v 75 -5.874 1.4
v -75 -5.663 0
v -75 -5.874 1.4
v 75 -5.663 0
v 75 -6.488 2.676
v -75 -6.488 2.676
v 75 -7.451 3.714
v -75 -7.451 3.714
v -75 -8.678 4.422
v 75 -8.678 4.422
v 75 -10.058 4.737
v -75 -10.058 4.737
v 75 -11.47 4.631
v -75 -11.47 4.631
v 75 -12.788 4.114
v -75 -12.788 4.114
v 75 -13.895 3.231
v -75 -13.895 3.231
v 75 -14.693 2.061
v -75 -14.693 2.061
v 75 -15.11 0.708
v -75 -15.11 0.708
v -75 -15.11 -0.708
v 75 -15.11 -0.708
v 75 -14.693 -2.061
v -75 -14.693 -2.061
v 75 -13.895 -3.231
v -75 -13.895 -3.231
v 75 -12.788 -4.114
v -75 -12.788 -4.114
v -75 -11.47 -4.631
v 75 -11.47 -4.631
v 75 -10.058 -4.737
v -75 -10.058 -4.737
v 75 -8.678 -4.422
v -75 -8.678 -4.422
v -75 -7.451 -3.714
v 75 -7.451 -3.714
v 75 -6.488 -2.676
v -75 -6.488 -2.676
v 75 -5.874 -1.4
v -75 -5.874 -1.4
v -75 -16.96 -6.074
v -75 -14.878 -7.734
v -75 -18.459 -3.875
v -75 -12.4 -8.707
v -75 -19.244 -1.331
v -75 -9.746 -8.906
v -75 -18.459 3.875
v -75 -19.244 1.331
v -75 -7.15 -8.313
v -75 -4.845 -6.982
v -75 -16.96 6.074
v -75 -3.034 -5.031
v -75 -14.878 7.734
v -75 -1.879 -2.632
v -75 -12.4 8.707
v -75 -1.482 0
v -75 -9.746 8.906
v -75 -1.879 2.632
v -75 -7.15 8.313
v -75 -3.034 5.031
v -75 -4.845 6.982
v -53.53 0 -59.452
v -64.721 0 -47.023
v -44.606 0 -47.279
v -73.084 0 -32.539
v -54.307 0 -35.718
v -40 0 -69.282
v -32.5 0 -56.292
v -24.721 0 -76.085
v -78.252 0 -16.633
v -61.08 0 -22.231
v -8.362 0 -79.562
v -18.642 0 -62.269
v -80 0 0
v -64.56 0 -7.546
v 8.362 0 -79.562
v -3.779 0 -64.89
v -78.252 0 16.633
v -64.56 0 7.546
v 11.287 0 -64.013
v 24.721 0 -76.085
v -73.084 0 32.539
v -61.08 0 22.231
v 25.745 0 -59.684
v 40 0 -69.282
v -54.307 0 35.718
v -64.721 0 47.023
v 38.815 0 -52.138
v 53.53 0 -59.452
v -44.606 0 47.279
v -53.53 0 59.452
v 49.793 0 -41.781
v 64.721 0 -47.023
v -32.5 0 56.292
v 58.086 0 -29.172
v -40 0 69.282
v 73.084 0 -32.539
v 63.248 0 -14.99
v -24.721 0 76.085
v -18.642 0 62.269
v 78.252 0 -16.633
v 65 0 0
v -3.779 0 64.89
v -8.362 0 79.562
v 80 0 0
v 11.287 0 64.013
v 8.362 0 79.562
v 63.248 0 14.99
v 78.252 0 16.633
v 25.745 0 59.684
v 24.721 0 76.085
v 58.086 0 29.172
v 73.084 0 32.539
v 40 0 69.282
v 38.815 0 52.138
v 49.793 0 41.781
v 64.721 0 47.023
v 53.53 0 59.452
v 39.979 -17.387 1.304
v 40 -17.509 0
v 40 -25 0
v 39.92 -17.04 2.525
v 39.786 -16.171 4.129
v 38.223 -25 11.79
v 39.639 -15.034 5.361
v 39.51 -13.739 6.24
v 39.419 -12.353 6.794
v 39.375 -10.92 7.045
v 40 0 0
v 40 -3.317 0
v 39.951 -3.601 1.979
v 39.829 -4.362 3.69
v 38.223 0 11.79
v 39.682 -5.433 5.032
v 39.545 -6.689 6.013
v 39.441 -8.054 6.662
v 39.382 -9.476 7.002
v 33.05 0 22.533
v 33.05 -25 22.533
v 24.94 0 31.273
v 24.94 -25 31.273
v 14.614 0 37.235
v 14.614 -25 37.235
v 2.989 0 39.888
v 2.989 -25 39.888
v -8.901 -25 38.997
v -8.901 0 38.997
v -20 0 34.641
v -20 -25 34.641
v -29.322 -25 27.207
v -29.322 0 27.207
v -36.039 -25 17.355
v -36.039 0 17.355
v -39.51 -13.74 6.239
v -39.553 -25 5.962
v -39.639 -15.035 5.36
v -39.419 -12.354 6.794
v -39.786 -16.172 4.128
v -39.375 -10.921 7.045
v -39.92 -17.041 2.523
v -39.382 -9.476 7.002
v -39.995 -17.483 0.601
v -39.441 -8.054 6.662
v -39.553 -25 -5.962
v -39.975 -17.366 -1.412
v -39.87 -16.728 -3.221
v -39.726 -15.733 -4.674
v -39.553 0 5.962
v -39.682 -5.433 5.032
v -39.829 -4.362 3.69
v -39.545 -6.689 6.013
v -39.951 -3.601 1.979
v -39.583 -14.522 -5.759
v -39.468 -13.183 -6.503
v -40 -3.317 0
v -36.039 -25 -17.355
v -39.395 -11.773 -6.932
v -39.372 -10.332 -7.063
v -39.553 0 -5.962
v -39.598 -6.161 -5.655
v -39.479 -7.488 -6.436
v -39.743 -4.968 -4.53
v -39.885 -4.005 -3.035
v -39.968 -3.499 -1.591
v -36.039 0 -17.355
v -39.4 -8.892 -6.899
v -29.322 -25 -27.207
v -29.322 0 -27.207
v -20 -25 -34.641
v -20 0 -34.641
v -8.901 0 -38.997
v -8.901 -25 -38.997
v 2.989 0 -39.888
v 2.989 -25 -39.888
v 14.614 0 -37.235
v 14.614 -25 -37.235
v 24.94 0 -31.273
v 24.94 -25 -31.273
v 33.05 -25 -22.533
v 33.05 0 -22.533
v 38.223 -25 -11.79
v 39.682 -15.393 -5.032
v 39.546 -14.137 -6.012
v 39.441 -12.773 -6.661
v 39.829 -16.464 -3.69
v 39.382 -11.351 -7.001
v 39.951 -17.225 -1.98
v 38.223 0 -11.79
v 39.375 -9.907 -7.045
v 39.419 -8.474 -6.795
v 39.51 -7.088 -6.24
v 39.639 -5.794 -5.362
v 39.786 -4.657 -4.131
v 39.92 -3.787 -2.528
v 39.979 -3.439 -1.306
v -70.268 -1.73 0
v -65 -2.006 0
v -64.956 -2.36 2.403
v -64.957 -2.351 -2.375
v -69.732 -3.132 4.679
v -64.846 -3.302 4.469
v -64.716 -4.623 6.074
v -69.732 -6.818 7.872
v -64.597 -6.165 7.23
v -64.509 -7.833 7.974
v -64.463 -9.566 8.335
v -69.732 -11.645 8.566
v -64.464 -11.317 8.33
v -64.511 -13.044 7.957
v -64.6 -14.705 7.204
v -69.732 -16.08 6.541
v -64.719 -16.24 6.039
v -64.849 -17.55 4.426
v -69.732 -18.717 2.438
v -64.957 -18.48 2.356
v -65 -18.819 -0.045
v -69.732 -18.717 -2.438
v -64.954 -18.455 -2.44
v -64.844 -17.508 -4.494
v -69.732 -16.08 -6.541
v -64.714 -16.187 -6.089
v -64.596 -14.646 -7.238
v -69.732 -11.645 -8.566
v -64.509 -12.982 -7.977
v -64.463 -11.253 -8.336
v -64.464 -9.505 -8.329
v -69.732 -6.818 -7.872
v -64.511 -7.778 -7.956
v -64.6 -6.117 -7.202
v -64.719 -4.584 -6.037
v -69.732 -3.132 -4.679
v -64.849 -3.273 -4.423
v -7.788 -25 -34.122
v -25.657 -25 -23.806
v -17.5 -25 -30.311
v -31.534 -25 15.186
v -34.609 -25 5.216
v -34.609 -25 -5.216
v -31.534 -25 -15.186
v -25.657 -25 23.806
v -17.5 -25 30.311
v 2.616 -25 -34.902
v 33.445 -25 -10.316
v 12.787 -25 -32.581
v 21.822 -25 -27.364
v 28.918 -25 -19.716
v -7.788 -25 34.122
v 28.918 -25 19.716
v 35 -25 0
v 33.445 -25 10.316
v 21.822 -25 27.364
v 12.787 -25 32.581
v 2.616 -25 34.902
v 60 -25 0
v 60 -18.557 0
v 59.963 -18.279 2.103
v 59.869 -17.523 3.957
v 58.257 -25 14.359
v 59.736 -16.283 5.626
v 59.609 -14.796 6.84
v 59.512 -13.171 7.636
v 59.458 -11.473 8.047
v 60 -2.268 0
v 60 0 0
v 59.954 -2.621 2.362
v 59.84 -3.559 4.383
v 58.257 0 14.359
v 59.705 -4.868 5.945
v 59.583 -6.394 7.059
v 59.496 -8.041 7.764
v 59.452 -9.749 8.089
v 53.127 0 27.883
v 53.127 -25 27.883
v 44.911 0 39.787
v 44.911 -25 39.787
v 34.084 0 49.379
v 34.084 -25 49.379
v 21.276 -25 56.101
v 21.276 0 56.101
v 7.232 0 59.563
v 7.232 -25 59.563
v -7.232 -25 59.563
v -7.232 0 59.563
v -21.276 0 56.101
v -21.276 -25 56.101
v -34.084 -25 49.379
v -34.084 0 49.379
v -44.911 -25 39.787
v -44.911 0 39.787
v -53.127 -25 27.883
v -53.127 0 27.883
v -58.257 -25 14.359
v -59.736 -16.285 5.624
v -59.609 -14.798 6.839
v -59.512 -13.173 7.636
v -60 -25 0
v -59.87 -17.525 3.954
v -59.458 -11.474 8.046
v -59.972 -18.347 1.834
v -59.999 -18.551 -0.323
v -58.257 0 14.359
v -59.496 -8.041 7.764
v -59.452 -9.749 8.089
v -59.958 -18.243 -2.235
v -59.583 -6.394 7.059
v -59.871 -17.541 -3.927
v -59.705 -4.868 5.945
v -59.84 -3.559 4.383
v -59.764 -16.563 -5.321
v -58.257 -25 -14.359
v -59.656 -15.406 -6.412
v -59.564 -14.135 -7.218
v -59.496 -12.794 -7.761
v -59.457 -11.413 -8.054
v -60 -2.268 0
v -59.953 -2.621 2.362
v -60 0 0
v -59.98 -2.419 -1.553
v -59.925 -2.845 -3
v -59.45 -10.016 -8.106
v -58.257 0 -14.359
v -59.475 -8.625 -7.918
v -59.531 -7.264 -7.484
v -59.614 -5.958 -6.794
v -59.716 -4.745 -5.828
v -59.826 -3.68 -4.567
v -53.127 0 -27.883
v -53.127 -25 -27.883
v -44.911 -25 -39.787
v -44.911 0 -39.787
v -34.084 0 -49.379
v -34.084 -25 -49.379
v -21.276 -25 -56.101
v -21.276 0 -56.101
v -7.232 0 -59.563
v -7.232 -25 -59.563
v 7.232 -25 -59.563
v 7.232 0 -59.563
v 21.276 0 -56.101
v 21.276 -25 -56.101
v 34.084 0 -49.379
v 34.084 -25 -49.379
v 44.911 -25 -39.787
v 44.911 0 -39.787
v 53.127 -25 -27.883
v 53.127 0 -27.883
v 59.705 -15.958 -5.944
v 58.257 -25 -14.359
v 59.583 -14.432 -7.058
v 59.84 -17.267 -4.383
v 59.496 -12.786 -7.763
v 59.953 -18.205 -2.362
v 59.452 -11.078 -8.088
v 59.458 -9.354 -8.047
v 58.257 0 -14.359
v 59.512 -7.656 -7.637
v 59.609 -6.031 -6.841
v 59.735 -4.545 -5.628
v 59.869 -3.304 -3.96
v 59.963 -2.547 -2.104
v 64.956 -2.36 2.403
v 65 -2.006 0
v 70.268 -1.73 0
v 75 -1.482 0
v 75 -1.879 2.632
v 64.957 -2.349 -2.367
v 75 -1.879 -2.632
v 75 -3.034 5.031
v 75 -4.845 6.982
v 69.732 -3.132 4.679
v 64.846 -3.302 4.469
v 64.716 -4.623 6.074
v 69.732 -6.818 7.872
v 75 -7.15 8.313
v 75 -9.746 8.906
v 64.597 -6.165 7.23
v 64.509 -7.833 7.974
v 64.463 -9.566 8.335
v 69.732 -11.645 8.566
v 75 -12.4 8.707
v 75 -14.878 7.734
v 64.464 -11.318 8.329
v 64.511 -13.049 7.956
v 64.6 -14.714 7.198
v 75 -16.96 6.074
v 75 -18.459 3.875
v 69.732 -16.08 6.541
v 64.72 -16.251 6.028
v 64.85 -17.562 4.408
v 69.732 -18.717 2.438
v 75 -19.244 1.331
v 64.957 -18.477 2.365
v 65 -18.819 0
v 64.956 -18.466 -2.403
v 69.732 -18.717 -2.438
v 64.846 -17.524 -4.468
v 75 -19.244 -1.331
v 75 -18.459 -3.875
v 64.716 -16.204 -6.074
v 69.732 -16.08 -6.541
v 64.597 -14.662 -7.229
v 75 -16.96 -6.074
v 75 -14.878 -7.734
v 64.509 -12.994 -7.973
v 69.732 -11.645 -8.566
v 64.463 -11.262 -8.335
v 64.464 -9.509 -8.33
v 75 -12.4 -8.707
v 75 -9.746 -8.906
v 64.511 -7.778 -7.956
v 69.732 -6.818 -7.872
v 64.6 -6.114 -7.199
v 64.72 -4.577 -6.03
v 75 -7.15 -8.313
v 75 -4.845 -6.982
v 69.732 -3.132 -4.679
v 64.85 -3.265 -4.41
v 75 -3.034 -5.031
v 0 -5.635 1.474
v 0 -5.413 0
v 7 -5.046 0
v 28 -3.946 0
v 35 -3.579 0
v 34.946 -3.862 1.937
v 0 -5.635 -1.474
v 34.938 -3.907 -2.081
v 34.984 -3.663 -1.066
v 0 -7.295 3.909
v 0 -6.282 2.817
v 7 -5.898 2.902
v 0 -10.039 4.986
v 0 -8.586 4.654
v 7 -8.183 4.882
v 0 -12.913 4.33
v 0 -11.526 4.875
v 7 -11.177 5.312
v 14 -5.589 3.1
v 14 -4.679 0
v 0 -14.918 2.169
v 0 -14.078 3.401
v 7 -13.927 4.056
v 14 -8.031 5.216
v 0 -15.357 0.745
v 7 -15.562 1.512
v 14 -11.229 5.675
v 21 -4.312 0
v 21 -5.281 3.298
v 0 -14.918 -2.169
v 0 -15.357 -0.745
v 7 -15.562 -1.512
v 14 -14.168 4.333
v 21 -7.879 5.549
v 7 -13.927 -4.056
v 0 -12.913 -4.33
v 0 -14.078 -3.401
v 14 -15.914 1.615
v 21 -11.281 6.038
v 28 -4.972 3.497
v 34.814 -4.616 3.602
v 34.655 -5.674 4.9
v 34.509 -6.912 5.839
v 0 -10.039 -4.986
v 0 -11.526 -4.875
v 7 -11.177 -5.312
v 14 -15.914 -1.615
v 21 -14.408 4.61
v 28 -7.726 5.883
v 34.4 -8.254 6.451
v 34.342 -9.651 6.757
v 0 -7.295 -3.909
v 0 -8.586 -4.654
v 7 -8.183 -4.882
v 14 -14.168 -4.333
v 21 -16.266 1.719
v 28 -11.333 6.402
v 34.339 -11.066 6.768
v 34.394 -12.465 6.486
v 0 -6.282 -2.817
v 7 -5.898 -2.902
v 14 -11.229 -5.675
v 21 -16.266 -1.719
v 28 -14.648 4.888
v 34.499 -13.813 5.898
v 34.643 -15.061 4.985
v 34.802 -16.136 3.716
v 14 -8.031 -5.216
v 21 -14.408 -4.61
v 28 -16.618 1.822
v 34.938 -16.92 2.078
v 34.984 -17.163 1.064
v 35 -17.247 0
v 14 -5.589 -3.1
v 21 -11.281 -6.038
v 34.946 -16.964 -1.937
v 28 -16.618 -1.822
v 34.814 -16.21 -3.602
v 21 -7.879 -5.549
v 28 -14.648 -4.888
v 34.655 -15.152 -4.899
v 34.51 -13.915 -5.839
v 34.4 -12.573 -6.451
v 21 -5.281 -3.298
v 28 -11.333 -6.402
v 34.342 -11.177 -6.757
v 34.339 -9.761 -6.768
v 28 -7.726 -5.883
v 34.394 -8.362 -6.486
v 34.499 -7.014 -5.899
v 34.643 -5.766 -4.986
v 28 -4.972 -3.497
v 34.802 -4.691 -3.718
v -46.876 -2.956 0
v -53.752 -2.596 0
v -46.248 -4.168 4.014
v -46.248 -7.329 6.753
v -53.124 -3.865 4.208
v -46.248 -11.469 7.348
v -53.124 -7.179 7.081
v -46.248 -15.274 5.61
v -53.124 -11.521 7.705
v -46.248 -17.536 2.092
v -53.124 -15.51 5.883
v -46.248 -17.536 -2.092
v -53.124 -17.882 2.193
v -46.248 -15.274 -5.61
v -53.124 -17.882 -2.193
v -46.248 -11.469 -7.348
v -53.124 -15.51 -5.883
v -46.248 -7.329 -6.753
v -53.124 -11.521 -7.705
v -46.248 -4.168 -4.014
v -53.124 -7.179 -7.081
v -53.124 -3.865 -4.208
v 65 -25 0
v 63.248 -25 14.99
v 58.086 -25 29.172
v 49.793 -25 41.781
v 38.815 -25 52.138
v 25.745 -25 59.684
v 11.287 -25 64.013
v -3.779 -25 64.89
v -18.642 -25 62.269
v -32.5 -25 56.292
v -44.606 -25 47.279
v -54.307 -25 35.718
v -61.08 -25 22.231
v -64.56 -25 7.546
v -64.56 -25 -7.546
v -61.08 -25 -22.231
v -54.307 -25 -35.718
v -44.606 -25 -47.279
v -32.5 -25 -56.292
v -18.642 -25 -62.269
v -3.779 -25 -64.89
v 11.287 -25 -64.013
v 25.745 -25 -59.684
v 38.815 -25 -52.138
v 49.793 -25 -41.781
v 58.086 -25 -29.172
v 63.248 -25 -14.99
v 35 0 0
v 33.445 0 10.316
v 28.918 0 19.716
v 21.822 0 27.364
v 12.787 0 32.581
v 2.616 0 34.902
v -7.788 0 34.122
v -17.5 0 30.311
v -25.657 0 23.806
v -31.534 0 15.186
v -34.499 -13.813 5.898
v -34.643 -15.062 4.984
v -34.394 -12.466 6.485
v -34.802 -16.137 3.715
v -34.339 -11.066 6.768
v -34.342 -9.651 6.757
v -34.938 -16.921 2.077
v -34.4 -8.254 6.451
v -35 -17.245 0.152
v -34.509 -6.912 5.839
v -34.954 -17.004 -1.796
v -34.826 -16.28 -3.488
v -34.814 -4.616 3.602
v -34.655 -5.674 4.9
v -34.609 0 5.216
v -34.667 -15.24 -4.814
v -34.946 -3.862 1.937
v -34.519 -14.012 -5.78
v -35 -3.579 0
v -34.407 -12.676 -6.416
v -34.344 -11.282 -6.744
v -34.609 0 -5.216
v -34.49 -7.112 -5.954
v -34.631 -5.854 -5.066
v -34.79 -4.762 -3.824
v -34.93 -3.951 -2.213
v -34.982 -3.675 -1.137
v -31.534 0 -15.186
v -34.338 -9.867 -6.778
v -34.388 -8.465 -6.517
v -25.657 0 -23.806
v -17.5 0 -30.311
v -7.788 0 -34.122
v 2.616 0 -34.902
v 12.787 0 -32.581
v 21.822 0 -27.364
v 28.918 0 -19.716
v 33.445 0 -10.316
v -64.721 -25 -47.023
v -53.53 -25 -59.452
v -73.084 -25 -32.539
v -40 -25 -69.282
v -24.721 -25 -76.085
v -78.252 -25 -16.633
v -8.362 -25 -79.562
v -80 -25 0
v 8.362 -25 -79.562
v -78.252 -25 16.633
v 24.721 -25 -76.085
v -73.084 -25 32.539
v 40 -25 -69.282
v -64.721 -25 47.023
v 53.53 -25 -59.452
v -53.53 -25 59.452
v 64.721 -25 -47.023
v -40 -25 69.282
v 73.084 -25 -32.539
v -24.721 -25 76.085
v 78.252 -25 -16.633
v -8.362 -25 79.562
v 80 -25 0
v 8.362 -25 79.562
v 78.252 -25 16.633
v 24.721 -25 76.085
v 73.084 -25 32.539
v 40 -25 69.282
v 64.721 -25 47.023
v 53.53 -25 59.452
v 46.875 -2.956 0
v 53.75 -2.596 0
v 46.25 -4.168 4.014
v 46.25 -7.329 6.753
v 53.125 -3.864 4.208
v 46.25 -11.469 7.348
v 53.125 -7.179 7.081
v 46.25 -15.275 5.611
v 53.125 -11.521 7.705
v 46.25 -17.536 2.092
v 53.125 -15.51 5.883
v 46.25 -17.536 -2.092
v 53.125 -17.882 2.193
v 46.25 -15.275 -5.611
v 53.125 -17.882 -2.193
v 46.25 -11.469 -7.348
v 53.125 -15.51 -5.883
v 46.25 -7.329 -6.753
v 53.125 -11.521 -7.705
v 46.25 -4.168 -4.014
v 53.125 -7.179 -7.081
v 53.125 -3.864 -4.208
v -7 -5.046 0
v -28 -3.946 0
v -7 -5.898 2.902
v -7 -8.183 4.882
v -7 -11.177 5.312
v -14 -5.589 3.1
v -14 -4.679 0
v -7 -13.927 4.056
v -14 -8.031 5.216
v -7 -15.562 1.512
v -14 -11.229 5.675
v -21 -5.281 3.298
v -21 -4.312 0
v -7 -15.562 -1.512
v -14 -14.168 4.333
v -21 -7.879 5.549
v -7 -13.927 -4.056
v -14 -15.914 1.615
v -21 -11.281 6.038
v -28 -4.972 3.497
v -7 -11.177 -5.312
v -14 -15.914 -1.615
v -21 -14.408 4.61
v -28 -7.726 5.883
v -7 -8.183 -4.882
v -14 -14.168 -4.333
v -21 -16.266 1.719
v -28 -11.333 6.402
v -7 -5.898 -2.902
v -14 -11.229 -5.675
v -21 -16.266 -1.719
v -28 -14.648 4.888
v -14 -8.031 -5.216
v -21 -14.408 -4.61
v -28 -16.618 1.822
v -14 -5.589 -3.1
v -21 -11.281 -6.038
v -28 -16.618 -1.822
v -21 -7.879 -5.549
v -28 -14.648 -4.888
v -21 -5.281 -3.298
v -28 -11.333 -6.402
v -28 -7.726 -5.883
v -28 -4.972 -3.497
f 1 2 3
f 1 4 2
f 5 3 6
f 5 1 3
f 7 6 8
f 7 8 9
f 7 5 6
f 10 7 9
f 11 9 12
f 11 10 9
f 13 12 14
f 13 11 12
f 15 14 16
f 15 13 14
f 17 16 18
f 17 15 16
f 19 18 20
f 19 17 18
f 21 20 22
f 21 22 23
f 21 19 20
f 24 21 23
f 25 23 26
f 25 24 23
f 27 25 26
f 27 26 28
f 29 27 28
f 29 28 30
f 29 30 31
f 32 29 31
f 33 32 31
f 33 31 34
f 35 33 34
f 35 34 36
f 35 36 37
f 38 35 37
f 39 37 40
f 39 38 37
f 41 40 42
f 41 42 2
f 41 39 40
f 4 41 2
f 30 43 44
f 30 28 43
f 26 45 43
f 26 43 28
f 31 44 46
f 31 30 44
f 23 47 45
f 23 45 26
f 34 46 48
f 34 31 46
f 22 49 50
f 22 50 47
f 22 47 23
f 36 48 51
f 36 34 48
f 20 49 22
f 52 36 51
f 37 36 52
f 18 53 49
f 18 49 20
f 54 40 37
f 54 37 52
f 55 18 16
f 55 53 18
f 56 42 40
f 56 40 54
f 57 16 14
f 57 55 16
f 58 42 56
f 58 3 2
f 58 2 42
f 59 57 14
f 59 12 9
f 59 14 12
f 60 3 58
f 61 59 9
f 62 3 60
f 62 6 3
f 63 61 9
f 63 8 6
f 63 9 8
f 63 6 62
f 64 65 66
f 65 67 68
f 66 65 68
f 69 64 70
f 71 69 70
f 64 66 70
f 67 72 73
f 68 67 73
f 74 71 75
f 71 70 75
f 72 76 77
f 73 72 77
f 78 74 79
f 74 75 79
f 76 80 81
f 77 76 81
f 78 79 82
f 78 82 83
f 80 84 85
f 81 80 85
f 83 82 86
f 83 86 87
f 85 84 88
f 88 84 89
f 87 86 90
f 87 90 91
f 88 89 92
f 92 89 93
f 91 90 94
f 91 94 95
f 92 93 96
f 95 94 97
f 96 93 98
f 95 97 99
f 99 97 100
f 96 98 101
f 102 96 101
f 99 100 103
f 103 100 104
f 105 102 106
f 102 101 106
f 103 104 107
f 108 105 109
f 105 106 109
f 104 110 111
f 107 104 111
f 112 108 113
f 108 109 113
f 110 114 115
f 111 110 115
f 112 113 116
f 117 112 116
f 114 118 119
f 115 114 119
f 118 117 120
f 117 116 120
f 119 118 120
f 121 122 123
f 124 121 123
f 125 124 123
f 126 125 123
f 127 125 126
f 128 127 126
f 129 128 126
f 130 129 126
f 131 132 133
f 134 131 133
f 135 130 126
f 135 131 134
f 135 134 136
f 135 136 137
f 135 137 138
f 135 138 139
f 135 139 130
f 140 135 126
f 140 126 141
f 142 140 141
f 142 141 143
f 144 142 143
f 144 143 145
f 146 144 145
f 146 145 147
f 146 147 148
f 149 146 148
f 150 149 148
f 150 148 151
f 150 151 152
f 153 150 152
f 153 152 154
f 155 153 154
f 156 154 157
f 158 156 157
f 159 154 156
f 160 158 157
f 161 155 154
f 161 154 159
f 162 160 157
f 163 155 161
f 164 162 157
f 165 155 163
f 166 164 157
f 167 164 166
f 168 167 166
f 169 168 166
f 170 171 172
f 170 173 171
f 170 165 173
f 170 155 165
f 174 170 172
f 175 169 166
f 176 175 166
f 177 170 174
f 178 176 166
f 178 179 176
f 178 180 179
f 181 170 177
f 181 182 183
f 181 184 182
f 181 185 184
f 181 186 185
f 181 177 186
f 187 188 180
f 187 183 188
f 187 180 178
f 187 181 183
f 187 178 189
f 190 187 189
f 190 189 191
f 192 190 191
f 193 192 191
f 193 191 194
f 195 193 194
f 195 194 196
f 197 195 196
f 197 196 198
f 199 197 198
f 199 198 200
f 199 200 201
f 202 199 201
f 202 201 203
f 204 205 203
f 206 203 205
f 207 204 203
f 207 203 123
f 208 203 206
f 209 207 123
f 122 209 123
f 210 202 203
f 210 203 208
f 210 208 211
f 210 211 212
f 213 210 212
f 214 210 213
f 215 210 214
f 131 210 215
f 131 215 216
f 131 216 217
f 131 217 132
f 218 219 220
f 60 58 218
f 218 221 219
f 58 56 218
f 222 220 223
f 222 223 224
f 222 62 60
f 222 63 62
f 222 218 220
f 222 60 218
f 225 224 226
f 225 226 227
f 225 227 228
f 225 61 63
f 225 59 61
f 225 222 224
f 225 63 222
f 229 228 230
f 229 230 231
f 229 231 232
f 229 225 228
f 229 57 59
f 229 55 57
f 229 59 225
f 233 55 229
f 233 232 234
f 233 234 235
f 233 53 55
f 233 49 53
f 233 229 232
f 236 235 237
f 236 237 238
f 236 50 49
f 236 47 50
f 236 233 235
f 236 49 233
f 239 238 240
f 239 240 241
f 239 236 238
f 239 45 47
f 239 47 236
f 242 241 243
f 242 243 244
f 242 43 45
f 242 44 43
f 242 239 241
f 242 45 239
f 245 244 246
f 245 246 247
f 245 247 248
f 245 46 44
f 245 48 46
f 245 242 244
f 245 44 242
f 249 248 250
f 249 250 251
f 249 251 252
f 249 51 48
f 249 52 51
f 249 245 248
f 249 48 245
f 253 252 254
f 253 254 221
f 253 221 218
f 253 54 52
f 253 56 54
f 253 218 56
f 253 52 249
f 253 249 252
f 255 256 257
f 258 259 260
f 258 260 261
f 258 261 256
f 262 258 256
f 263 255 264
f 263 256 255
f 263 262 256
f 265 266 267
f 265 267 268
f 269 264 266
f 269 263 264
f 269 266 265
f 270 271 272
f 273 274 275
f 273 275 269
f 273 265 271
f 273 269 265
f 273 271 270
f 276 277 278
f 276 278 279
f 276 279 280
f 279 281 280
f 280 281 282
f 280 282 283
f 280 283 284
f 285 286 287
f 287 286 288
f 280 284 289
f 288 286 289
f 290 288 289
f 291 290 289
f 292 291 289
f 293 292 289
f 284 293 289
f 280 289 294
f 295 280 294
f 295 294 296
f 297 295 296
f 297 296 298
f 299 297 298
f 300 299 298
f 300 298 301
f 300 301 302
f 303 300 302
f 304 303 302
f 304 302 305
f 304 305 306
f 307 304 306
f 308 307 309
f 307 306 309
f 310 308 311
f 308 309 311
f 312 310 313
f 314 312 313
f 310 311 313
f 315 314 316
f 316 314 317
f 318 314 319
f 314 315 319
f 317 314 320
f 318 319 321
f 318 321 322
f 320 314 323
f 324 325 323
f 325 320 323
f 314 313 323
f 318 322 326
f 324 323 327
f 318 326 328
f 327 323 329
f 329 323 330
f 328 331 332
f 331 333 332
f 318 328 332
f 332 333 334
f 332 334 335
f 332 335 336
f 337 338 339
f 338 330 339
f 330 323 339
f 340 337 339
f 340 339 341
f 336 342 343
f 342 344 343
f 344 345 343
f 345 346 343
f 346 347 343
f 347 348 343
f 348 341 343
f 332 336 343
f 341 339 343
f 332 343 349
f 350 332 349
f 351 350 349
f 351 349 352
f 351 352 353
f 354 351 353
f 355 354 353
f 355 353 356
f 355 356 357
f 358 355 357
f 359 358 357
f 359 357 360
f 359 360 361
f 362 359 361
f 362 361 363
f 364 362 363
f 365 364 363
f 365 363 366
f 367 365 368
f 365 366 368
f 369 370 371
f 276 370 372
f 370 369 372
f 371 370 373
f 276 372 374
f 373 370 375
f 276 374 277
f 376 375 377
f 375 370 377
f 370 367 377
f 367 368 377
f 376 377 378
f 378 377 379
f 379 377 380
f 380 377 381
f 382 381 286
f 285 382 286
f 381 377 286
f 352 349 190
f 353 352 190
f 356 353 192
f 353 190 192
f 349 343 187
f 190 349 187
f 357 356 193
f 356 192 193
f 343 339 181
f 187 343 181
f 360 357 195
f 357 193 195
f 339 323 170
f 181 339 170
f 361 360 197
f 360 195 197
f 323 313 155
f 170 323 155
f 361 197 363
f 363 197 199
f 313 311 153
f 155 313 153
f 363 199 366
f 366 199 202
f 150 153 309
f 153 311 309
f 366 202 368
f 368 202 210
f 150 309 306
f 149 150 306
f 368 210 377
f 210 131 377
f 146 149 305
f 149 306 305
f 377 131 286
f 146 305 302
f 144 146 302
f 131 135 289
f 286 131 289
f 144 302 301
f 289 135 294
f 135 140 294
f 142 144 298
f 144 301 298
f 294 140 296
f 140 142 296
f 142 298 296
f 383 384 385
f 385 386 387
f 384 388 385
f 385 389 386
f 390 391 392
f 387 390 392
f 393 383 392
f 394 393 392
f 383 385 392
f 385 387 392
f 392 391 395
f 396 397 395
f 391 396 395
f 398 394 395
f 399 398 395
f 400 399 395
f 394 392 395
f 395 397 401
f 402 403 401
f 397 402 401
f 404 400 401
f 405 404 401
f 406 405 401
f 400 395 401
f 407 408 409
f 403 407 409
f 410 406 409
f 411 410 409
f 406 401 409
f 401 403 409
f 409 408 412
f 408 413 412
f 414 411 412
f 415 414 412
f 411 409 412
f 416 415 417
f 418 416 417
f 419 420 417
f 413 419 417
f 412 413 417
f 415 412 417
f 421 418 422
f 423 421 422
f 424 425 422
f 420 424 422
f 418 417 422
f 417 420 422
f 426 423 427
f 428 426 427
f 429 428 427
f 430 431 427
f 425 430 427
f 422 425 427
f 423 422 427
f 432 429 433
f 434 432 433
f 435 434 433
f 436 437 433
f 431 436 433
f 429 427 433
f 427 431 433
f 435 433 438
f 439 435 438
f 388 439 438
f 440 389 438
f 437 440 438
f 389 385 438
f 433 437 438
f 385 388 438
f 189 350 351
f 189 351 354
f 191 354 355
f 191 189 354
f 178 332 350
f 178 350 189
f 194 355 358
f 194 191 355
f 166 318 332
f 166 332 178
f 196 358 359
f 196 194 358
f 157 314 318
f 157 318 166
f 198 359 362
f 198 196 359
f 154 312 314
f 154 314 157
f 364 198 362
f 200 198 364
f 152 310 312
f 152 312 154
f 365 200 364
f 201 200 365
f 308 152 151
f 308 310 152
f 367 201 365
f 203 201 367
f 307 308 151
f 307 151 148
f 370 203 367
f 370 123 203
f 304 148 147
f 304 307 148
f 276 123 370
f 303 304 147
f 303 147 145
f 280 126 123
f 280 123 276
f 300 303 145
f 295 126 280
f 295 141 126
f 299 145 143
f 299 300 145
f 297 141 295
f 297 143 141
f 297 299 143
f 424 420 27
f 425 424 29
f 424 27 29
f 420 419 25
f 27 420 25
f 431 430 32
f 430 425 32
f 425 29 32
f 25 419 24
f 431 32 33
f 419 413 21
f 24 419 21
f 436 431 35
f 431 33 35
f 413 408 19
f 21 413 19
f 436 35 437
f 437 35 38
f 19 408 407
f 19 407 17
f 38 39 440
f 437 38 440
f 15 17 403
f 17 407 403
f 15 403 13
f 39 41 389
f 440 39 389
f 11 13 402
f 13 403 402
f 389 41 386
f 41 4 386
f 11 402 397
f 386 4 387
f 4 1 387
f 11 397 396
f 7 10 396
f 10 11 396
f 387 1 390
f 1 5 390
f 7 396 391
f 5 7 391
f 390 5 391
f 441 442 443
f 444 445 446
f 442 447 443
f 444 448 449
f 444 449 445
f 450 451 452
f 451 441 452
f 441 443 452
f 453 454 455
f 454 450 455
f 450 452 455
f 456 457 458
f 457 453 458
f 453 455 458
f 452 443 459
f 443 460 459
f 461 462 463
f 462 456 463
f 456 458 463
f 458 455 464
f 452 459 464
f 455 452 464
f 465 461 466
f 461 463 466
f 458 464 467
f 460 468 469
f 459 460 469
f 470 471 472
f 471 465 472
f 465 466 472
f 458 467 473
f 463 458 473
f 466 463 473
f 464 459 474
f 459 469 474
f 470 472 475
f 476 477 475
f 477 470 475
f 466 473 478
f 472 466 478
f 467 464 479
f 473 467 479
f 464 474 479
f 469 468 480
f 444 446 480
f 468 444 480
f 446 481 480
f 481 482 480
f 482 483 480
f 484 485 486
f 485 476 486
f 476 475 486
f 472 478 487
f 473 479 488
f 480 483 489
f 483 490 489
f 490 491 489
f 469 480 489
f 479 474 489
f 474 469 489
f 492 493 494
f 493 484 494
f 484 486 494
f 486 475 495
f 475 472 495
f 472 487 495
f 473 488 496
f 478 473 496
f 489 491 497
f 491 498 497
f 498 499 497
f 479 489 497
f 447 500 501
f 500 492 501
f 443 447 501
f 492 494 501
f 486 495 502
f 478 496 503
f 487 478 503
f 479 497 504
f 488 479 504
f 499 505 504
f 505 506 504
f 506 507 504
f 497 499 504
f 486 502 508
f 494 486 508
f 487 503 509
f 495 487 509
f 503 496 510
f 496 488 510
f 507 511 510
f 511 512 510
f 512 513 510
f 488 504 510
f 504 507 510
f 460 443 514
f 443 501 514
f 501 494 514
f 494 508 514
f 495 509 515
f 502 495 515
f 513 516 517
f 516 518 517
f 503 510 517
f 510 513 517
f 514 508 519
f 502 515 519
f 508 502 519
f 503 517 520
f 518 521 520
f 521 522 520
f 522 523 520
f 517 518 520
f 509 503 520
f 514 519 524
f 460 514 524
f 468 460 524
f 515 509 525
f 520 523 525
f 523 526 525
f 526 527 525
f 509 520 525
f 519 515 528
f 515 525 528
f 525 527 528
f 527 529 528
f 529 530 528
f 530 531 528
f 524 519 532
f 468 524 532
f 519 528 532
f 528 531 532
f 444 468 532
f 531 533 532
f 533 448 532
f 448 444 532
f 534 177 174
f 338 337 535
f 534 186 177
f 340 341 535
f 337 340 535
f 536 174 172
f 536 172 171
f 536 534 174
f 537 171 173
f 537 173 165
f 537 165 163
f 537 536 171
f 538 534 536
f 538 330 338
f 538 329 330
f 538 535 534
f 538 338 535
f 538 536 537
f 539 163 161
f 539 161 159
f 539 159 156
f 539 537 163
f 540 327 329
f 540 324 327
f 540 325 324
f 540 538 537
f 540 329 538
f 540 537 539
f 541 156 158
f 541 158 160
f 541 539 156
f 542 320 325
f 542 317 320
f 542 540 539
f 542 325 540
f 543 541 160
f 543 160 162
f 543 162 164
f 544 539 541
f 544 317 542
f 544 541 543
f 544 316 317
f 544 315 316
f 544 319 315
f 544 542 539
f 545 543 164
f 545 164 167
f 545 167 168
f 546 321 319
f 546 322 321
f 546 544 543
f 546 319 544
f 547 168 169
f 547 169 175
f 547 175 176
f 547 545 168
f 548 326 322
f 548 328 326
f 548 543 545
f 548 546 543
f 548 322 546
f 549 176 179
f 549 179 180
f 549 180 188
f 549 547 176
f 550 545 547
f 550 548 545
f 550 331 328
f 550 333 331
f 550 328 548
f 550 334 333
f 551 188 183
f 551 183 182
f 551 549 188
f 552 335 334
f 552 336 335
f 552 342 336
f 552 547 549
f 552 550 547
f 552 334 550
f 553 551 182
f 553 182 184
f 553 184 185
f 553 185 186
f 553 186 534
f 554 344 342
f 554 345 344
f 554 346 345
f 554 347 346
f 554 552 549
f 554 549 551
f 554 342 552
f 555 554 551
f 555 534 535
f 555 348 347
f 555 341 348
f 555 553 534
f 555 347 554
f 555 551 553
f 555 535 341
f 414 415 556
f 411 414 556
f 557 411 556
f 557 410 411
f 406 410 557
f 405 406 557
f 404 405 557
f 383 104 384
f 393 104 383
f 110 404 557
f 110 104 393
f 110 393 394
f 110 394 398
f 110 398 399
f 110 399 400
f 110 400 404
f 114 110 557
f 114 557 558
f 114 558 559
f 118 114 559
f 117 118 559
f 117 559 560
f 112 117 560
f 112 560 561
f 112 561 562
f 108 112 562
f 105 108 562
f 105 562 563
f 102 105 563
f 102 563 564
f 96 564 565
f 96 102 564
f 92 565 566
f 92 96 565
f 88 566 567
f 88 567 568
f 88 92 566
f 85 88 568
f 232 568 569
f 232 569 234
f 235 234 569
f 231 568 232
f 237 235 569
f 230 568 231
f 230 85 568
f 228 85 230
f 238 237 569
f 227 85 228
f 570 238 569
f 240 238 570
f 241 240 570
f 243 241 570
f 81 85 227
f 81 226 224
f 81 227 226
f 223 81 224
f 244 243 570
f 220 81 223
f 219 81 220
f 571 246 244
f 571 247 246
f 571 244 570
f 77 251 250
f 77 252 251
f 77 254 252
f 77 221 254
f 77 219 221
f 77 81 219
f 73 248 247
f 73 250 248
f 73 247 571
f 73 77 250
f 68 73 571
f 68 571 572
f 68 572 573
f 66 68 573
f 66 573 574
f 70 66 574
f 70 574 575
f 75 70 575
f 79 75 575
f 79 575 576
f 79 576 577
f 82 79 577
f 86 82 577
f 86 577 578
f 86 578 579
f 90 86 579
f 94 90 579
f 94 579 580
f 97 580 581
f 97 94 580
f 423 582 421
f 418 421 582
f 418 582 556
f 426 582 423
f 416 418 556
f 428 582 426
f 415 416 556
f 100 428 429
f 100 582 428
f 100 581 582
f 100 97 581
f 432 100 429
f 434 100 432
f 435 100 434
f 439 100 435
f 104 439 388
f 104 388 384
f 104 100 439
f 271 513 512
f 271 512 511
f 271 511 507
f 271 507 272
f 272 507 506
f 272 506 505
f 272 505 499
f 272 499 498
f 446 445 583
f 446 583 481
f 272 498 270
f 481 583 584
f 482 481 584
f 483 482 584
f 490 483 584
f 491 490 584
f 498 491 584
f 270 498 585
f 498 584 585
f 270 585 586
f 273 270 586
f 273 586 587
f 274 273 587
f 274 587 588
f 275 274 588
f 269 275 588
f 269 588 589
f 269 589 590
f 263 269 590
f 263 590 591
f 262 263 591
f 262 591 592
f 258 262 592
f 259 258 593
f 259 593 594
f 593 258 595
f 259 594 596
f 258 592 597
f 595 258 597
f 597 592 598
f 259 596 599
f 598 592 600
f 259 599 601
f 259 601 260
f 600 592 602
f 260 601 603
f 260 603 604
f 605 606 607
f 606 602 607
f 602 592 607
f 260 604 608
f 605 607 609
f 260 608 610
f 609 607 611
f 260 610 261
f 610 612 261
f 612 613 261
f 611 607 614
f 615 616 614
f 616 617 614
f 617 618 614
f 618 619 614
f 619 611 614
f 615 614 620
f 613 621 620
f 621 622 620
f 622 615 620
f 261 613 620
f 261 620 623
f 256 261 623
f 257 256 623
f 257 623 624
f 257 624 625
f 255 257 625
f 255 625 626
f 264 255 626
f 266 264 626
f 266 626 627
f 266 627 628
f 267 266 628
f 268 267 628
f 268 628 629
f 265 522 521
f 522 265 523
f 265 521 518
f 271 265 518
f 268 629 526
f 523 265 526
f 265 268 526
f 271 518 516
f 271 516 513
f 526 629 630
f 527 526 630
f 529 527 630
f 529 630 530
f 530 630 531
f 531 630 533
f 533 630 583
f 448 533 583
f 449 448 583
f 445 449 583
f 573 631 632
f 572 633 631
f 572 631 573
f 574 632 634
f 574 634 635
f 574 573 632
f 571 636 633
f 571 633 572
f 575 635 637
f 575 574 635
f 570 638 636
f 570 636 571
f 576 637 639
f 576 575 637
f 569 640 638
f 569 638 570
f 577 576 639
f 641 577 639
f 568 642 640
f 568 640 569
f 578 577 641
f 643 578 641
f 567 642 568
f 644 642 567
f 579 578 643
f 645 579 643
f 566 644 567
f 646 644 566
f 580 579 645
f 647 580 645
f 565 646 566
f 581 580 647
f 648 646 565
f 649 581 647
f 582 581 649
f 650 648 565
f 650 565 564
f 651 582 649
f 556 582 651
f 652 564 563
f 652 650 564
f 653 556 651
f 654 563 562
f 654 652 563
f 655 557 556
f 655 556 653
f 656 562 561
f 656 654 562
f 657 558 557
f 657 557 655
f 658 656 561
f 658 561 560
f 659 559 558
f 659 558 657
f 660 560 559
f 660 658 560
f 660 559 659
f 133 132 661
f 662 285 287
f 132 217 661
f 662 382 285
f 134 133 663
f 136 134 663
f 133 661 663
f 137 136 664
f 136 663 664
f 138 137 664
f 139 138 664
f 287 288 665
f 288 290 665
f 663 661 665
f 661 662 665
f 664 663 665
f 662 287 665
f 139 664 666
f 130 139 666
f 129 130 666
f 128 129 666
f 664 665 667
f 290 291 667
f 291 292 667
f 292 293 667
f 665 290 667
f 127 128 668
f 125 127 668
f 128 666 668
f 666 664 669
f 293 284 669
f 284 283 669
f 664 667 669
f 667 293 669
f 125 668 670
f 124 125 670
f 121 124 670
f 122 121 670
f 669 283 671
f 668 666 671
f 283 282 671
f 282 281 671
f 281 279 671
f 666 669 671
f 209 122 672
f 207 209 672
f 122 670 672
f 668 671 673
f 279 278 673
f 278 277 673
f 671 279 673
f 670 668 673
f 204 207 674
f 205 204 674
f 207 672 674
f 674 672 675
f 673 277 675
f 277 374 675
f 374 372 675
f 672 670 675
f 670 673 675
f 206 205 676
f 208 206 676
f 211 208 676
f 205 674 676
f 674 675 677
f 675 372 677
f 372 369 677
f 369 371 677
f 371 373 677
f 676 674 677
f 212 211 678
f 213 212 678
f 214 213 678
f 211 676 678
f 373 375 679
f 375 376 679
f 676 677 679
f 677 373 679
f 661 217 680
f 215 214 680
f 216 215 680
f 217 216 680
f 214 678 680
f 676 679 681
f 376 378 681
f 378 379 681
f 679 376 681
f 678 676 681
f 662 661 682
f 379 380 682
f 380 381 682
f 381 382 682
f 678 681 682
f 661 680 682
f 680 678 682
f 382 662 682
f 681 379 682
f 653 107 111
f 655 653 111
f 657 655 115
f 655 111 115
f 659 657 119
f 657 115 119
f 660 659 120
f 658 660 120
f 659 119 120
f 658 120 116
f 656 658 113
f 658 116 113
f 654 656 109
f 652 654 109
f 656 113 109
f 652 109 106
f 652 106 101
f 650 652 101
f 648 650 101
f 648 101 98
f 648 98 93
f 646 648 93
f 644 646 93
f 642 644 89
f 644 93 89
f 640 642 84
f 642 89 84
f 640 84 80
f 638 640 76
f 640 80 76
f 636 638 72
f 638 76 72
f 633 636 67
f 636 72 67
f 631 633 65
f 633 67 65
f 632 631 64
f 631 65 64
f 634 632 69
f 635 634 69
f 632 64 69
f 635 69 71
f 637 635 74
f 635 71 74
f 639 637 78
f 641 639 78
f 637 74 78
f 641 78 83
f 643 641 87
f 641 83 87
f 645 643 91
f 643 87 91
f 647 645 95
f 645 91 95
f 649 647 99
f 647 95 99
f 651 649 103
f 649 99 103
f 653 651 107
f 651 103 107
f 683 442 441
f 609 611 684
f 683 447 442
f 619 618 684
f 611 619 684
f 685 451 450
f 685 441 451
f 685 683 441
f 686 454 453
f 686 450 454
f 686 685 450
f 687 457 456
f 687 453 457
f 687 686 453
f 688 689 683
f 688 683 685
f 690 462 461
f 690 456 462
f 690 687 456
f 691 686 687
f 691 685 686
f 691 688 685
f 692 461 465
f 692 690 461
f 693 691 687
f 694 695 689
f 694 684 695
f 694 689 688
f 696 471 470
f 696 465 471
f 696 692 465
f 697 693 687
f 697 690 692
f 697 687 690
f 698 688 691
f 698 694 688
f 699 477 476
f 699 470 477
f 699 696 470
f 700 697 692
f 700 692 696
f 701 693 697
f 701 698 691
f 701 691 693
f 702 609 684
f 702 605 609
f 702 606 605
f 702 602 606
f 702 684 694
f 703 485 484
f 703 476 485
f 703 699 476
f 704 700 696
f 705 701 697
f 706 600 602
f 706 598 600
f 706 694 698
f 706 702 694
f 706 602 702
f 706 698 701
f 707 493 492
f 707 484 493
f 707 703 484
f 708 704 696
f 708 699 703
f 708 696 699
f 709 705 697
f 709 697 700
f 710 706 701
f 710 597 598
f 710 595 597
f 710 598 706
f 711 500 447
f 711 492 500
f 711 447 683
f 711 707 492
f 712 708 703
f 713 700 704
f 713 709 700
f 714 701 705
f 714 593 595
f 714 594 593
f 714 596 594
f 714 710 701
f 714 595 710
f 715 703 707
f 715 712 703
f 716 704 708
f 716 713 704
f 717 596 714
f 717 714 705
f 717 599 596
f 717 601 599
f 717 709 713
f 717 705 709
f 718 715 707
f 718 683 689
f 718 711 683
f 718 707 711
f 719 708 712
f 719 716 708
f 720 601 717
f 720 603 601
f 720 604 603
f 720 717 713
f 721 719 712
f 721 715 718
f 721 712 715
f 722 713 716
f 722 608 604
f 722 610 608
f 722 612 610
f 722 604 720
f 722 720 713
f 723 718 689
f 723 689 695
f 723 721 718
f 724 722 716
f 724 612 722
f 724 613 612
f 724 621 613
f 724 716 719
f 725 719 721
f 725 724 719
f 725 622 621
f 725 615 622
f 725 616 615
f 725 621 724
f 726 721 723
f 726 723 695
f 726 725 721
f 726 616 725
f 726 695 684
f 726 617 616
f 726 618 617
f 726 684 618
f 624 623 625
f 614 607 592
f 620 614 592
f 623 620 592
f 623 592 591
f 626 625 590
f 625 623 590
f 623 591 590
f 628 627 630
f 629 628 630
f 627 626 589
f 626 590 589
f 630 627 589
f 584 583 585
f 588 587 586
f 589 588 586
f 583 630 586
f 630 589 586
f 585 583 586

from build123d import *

# Parameters (mm, degrees)
F0_R     = 80
F0_R_2   = 65
F2_DEPTH = 25
F0_R_3   = 60
F0_R_4   = 40
F0_R_5   = 35
F1_R     = 5
F3_DEPTH = 75
F3_TAPER = -3
F4_R     = 4.75
F5_DEPTH = 77.5


with BuildPart() as f2:
    # F0 (on Front) → F2 (new body)
    with BuildSketch(Plane.XZ):
        Circle(F0_R)
        Circle(F0_R_2, mode=Mode.SUBTRACT)
    extrude(amount=F2_DEPTH)


with BuildPart() as f2b:
    # F0 (on Front) → F2, piece 2 (new body)
    with BuildSketch(Plane.XZ):
        Circle(F0_R_3)
        Circle(F0_R_4, mode=Mode.SUBTRACT)
    extrude(amount=F2_DEPTH)


with BuildPart() as f2c:
    # F0 (on Front) → F2, piece 3 (new body)
    with BuildSketch(Plane.XZ):
        Circle(F0_R_5)
    extrude(amount=F2_DEPTH)


with BuildPart() as f3_tool:
    # F1 (on Right) → F3 (new body, symmetric)
    with BuildSketch(Plane.YZ):
        with Locations((-10.4129427743, 0)):
            Circle(F1_R)
    extrude(amount=F3_DEPTH, both=True, taper=F3_TAPER)


with BuildPart() as f2_1:
    add(f2.part)

    # F3: cut by f3_tool
    add(f3_tool.part, mode=Mode.SUBTRACT)

    # F4 (on face) → F5 (join, symmetric)
    with BuildSketch(Plane.YZ):
        with Locations((-10.4129427743, 0)):
            Circle(F4_R)
    extrude(amount=F5_DEPTH, both=True)


with BuildPart() as f2b_1:
    add(f2b.part)

    # F3: cut by f3_tool
    add(f3_tool.part, mode=Mode.SUBTRACT)


with BuildPart() as f2c_1:
    add(f2c.part)

    # F3: cut by f3_tool
    add(f3_tool.part, mode=Mode.SUBTRACT)


solid = Compound([f2_1.part, f2b_1.part, f2c_1.part])
